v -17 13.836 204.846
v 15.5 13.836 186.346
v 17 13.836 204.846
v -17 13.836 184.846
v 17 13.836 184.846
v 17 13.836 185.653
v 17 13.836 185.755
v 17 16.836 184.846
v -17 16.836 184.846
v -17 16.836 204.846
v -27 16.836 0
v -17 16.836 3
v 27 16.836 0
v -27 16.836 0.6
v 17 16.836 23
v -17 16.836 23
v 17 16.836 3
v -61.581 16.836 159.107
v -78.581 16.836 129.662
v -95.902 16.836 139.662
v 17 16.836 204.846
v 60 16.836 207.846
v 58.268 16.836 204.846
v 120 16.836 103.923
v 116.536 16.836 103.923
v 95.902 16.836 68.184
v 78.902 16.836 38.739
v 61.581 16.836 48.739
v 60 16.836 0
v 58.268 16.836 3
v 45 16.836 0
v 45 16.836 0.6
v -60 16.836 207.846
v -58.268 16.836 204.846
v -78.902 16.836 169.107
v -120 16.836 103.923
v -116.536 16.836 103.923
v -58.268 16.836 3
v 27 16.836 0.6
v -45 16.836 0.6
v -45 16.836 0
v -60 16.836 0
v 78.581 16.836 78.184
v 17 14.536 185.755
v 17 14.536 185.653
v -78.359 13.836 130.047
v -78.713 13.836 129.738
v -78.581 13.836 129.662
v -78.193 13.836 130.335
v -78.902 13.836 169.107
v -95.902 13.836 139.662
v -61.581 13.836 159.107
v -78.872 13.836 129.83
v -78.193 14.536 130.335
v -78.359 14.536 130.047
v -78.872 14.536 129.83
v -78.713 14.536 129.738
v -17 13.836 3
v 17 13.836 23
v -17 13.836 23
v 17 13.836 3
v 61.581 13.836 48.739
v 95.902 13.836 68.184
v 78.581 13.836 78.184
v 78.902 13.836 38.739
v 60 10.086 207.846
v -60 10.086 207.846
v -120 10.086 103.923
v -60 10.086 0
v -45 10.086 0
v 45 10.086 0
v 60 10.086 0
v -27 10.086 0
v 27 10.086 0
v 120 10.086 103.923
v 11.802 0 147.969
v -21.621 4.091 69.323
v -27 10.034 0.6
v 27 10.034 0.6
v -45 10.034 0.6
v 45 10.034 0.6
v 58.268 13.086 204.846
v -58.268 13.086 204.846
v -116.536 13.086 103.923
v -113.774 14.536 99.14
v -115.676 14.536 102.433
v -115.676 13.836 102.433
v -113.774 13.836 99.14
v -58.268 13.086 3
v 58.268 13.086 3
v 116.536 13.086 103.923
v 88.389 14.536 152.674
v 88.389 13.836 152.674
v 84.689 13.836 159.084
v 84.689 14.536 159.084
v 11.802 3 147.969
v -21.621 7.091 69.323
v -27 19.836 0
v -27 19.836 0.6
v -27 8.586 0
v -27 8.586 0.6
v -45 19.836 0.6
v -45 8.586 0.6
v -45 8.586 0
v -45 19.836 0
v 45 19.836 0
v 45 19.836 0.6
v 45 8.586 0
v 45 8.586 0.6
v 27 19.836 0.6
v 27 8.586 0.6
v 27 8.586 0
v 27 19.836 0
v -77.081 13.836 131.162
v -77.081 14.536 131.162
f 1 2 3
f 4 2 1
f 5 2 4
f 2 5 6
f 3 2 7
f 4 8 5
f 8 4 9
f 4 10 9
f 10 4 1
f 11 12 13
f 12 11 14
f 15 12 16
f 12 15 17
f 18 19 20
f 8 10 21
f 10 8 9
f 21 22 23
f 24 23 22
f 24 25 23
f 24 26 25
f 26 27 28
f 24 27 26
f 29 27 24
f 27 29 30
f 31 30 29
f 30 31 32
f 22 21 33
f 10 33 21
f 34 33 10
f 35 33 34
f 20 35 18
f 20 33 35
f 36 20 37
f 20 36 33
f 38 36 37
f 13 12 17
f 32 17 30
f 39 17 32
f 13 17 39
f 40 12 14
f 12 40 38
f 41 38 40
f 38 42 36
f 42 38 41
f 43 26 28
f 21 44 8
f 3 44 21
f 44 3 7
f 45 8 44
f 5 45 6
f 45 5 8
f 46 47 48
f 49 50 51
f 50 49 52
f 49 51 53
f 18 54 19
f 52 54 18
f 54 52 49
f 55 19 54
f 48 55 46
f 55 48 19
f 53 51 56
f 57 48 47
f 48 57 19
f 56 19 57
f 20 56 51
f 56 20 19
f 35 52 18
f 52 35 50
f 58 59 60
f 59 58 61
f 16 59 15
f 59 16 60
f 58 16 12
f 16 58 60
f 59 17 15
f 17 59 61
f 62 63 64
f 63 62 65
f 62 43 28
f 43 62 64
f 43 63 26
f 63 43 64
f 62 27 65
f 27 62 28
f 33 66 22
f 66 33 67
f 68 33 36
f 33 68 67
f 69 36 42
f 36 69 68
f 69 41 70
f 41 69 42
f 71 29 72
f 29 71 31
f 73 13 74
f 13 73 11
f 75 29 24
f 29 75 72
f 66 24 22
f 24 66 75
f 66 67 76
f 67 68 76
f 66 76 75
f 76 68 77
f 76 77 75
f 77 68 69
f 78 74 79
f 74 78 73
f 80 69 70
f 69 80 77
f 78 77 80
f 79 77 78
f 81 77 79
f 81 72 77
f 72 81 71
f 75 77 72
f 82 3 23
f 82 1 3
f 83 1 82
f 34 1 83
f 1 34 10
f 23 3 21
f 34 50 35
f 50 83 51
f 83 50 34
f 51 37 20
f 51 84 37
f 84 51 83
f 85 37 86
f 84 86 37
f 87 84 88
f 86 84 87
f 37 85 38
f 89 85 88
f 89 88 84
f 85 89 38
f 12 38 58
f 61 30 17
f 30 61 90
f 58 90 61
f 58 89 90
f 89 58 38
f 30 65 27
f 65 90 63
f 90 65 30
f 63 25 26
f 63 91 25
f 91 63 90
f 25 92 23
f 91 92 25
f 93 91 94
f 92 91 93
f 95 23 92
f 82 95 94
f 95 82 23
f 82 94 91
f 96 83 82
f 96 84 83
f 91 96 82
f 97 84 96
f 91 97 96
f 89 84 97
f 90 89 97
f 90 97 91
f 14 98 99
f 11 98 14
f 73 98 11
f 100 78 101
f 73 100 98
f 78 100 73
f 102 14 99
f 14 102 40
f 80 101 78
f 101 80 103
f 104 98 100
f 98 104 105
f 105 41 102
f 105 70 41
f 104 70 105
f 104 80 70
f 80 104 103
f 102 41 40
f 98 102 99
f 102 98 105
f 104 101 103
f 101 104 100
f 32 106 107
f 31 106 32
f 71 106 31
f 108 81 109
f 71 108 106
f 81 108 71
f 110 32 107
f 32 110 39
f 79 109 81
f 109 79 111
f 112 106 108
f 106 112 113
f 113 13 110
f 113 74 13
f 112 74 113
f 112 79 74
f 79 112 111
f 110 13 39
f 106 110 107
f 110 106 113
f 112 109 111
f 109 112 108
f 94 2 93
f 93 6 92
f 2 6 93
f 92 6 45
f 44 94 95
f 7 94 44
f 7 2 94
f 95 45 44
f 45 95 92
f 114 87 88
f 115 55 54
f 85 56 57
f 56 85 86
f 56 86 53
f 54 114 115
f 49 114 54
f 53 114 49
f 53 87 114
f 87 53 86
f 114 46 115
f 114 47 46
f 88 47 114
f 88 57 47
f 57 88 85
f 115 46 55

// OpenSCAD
/*
    parametric_faceted_hex_wall_tile_mount_v28_multi_plate_gusset_support.scad
    ----------------------------------------------------------------
    Regular asymmetric low-poly hex wall tile.

    v28 goals
    ---------
    1. Multi-object plate packing is the default design target.
    2. Preserve a TRUE regular hexagon -- no X/Y stretching.
    3. Default maximum corner-to-corner width = 240 mm / 9.449 in.
    4. Vertical export rests on a complete flat hex side, not a point.
    5. Open back remains fully open.
    6. Hidden mounting pads remain clipped below the visible face.
    7. One master thickness controls shell, perimeter, and pads.
    8. Integrated low-profile sacrificial stabilizer feet are enabled by default.
    9. Automatic sacrificial INTERNAL GUSSETS support mounting pads that would
       otherwise begin in mid-air during vertical printing.
    10. Gussets grow diagonally from the perimeter wall toward the affected pad,
        avoiding tall free-standing support fins.
    11. Gussets stay on the cavity side so the wall/adhesive-facing rear surface
        remains unobstructed.

    Recommended default
    -------------------
    face_size_reference      = "across_corners";
    face_size_units          = "mm";
    face_size                = 240.0;   // 9.449" maximum width

    tile_rotation_deg        = 15;

    export_orientation       = "vertical";
    vertical_edge_angle_deg  = 15;      // flat side on build plate

    master_thickness_mm      = 3.0;
    add_mount_pads           = true;
    add_mount_ribs           = false;

    // Multi-copy stability:
    add_vertical_breakaway_feet = true;
    vertical_foot_depth_mm       = 5.0;
    vertical_foot_height_mm      = 0.60;
    vertical_foot_neck_mm        = 0.80;

    Export
    ------
    F6 Render
    File -> Export -> Export as STL
*/


// =============================================================================
// CUSTOMIZER PARAMETERS
// =============================================================================


/* [Finished Face Size] */

// "bounding_square"
//     face_size is the maximum X and Y envelope.
//
// "flat_to_flat"
//     face_size is the traditional hex flat-to-flat dimension.
//
// "across_corners"
//     face_size is the regular-hex corner-to-corner dimension.
//
// v28 DEFAULT:
// across_corners = 240 mm so the vertically printed tile is about:
//     X = 240.0 mm
//     Z = 207.85 mm
// while resting on a complete flat edge.
face_size_reference = "across_corners"; // [bounding_square, flat_to_flat, across_corners]

// Units used by face_size.
face_size_units = "mm";                   // [mm, in]

// Default = 240 mm / 9.449 in maximum corner-to-corner width.
// This leaves useful X-axis margin on a 256 mm plate.
face_size = 240.0;

// Rotation of the finished hex within its face plane.
//
// IMPORTANT:
// 15 degrees gives a regular hex an equal X/Y bounding envelope.
// With bounding_square + 254 mm this produces approximately:
//     X = 254.0 mm
//     Y = 254.0 mm
tile_rotation_deg = 15;


/* [Export / Print Orientation] */

// "flat"     = conventional CAD orientation; decorative face points +Z.
// "vertical" = rotate final part onto an edge for vertical printing.
export_orientation = "vertical";          // [flat, vertical]

// Additional in-plane rotation used ONLY before standing the part vertically.
//
// IMPORTANT:
// The finished face uses tile_rotation_deg = 15 so its X/Y envelope is exactly
// square. A regular hex rests on a FLAT SIDE when its effective print-plane
// rotation is 30 degrees (modulo 60 degrees).
//
// Therefore the default vertical export adds another 15 degrees:
//
//     15 deg finished-face rotation
//   + 15 deg vertical export rotation
//   = 30 deg effective print rotation
//
// This puts a complete flat hex side on the build plate instead of a point.
// The transformed model is automatically translated so that side rests at Z=0.
// Rotate the finished 15-degree face orientation another 15 degrees before
// standing it up. 15 + 15 = 30 degrees, which places a complete hex side
// horizontally at the bottom rather than balancing the tile on a vertex.
vertical_edge_angle_deg = 15;

// Add small breakaway stabilizer feet after the model is stood vertically.
// Normally leave OFF and use a slicer brim if required.
add_vertical_breakaway_feet = true;

// Breakaway-foot dimensions.
vertical_foot_length_mm = 18.0;
vertical_foot_depth_mm = 5.0;
vertical_foot_height_mm = 0.60;
vertical_foot_neck_mm = 0.80;


/* [MASTER THICKNESS] */

// Main material thickness control.
master_thickness_mm = 3.0;

// Optional tuning multipliers.
front_shell_multiplier = 1.0;
perimeter_multiplier   = 1.0;
mount_pad_multiplier   = 1.0;


/* [Front Relief] */

// "proportional" scales relief with the true flat-to-flat dimension.
// "absolute" uses explicit millimeter values.
relief_height_mode = "proportional";      // [proportional, absolute]

relief_scale = 1.0;

// Relative relief proportions.
peak_height_ratio = 0.081;
ridge_to_peak_ratio = 0.757;
edge_to_peak_ratio = 0.097;

// Used only in absolute mode.
peak_height_mm   = 18.5;
ridge_height_mm = 14.0;
edge_height_mm  = 1.8;

// Minimum air gap between inner roof and mounting geometry.
edge_clearance_mm = 0.60;


/* [Facet Layout] */

peak_angle_deg = 45;
peak_radius_ratio = 0.38;

ridge_angle_deg = 208;
ridge_radius_ratio = 0.34;


/* [Wall Mounting] */

add_mount_pads = true;

// Width parallel to local hex edge.
mount_pad_width_mm = 34.0;

// Radial depth into the cavity.
mount_pad_depth_mm = 24.0;

// Structural overlap beneath the inner perimeter shell.
mount_pad_overlap_mm = 4.0;

// Pull mounting geometry inward from the visible outside perimeter.
 // Keep this smaller than the perimeter-wall thickness so the pad still
 // overlaps the wall by a positive amount.
// IMPORTANT:
 // Must be LESS than perimeter_wall_thickness_mm so the pads physically
 // overlap the perimeter wall and become one connected solid.
 mount_pad_edge_inset_mm = 1.0;

// Clearance below underside of visible face.
mount_face_clearance_mm = 0.75;

// Mount-pad directions in the tile's local coordinate system.
mount_pad_angles = [60, 120, 240, 300];


/* [Mount Reinforcement] */

add_mount_ribs = false;

mount_rib_width_mm  = 3.0;
mount_rib_height_mm = 5.0;
mount_rib_depth_mm  = 8.0;


/* [Optional Screw Holes] */

add_pad_screw_holes = false;

pad_screw_hole_diameter_mm = 4.5;



/* [Plate Packing Guidance] */

// These values do NOT duplicate objects inside the STL.
// They provide planning numbers in the OpenSCAD console for arranging
// multiple copies in the slicer.
//
// Typical X2D-style plate planning:
//   usable Y = 256 mm
//   keep a conservative front/rear margin
plate_depth_mm = 256.0;

plate_front_margin_mm = 8.0;
plate_rear_margin_mm  = 8.0;

// Recommended empty gap between adjacent standing tiles.
// Increase if using aggressive acceleration or if the printer has noticeable
// resonance/wobble on tall parts.
recommended_inter_tile_gap_mm = 8.0;

// Feet extend from Y=0 to vertical_foot_depth_mm.
// The actual tile relief occupies approximately peak_height in Y.
// Packing pitch uses whichever is deeper, plus the inter-tile gap.


/* [Vertical Anti-Float Gussets] */

// Some mounting pads begin above the build plate when the tile is printed
// vertically. Instead of a tall free-standing fin, v28 generates a short,
// diagonal sacrificial gusset from the already-printed perimeter wall toward
// the lowest corner of each affected pad.
//
// The gusset:
// - stays inside the rear cavity
// - is thin in Y for easy removal
// - grows from the shell toward the pad
// - is generated only for pads that would otherwise start as an island
add_vertical_antifloat_gussets = true;

// Thin sacrificial thickness into the cavity.
antifloat_gusset_thickness_mm = 0.70;

// How far the gusset extends into the pad for reliable layer connection.
antifloat_gusset_pad_overlap_mm = 1.50;

// Vertical distance below the first pad layer used for the shell-side anchor.
// A 30 mm drop keeps the diagonal print angle conservative while remaining
// dramatically shorter than the previous full-height support fins.
antifloat_gusset_drop_mm = 30.0;

// Height of the short attachment edge against the perimeter wall.
antifloat_gusset_wall_base_mm = 5.0;

// Keep the wall anchor slightly inside the visible outer perimeter.
antifloat_gusset_wall_inset_mm = 1.5;

// Ignore a pad if its lowest point is already essentially on the build plate.
antifloat_min_height_mm = 0.80;


/* [Advanced] */

polyhedron_convexity = 12;
screw_hole_fn = 40;

// Small numerical tolerance.
eps = 0.01;


// =============================================================================
// HELPERS
// =============================================================================

function polar(angle_deg, radius) =
    [
        radius * cos(angle_deg),
        radius * sin(angle_deg)
    ];

function hex_vertex_unrotated(i, radius) =
    [
        radius * cos(30 + i * 60),
        radius * sin(30 + i * 60)
    ];

function rotate2d(p, angle_deg) =
    [
        p[0] * cos(angle_deg) - p[1] * sin(angle_deg),
        p[0] * sin(angle_deg) + p[1] * cos(angle_deg)
    ];


// Position of a raw mount-pad corner after all in-plane rotations used by the
// vertical export. Returned as [final_X, final_Z] because after rotate X=90,
// original in-plane Y becomes print Z.
function mount_print_corner(angle_deg, radial_r, lateral_t) =
    let(
        theta =
            angle_deg
            + tile_rotation_deg
            + vertical_edge_angle_deg
    )
    [
        radial_r * cos(theta) - lateral_t * sin(theta),
        vertical_half_y
            + radial_r * sin(theta)
            + lateral_t * cos(theta)
    ];

function mount_print_corners(angle_deg) =
    [
        mount_print_corner(
            angle_deg,
            mount_pad_inner_r,
            -mount_pad_width_mm / 2
        ),
        mount_print_corner(
            angle_deg,
            mount_pad_inner_r,
             mount_pad_width_mm / 2
        ),
        mount_print_corner(
            angle_deg,
            mount_pad_desired_outer_r,
            -mount_pad_width_mm / 2
        ),
        mount_print_corner(
            angle_deg,
            mount_pad_desired_outer_r,
             mount_pad_width_mm / 2
        )
    ];

function mount_corner_z_values(angle_deg) =
    [
        for (p = mount_print_corners(angle_deg))
            p[1]
    ];

function mount_lowest_z(angle_deg) =
    min(mount_corner_z_values(angle_deg));

function mount_lowest_corner_index(angle_deg) =
    search(
        mount_lowest_z(angle_deg),
        mount_corner_z_values(angle_deg)
    )[0];

function mount_lowest_x(angle_deg) =
    mount_print_corners(angle_deg)[
        mount_lowest_corner_index(angle_deg)
    ][0];


// Half-width of the stood-up regular hex at a given print Z.
//
// In the default flat-side-down vertical orientation:
// - bottom/top edges are flat
// - maximum width is across corners
// - total print height is flat-to-flat
//
// This lets the sacrificial gusset anchor itself directly into the perimeter
// wall at the same side of the tile as the affected mounting pad.
function vertical_hex_half_width_at_z(z_mm) =
    let(
        zc = min(max(z_mm, 0), vertical_print_height),
        dz = min(zc, vertical_print_height - zc)
    )
    hex_side_length / 2 + dz / tan(60);

function hex_vertex(i, radius) =
    rotate2d(
        hex_vertex_unrotated(i, radius),
        tile_rotation_deg
    );

// Half-width / half-height of a unit-circumradius rotated regular hex.
function unit_hex_half_x(rotation_deg) =
    max([
        for (i = [0 : 5])
            abs(
                cos(30 + i * 60 + rotation_deg)
            )
    ]);

function unit_hex_half_y(rotation_deg) =
    max([
        for (i = [0 : 5])
            abs(
                sin(30 + i * 60 + rotation_deg)
            )
    ]);

// Bounding box of a regular hex with circumradius r.
function hex_bbox_x(r, rotation_deg) =
    2 * r * unit_hex_half_x(rotation_deg);

function hex_bbox_y(r, rotation_deg) =
    2 * r * unit_hex_half_y(rotation_deg);


// =============================================================================
// DERIVED MATERIAL THICKNESSES
// =============================================================================

front_shell_thickness_mm =
    master_thickness_mm * front_shell_multiplier;

perimeter_wall_thickness_mm =
    master_thickness_mm * perimeter_multiplier;

mount_pad_thickness_mm =
    master_thickness_mm * mount_pad_multiplier;


// =============================================================================
// DERIVED FACE DIMENSIONS
// =============================================================================

_face_size_mm =
    face_size_units == "in"
        ? face_size * 25.4
        : face_size;

// If bounding_square is selected, choose the largest regular-hex radius that
// fits inside both the requested X and Y dimensions.
//
// At tile_rotation_deg = 15, unit X and Y extents are equal, so both dimensions
// become exactly face_size.
r_outer =
    face_size_reference == "flat_to_flat"
        ? (_face_size_mm / 2) / cos(30)
        : face_size_reference == "across_corners"
            ? _face_size_mm / 2
            : min(
                _face_size_mm / (2 * unit_hex_half_x(tile_rotation_deg)),
                _face_size_mm / (2 * unit_hex_half_y(tile_rotation_deg))
              );

tile_flat_to_flat =
    2 * r_outer * cos(30);

tile_across_corners =
    2 * r_outer;

finished_bbox_x =
    hex_bbox_x(r_outer, tile_rotation_deg);

finished_bbox_y =
    hex_bbox_y(r_outer, tile_rotation_deg);

outer_apothem =
    tile_flat_to_flat / 2;

inner_apothem =
    outer_apothem - perimeter_wall_thickness_mm;

r_inner =
    inner_apothem / cos(30);

inner_flat_length =
    2 * inner_apothem * tan(30);

hex_side_length =
    r_outer;


// =============================================================================
// DERIVED RELIEF HEIGHTS
// =============================================================================

_peak_unscaled =
    relief_height_mode == "proportional"
        ? tile_flat_to_flat * peak_height_ratio
        : peak_height_mm;

_ridge_unscaled =
    relief_height_mode == "proportional"
        ? _peak_unscaled * ridge_to_peak_ratio
        : ridge_height_mm;

_requested_edge_unscaled =
    relief_height_mode == "proportional"
        ? _peak_unscaled * edge_to_peak_ratio
        : edge_height_mm;

peak_height =
    _peak_unscaled * relief_scale;

ridge_height =
    _ridge_unscaled * relief_scale;

requested_edge_height =
    _requested_edge_unscaled * relief_scale;

// Enough vertical room for front shell + complete pad + clearance.
minimum_edge_height =
    front_shell_thickness_mm
    + mount_pad_thickness_mm
    + mount_face_clearance_mm;

edge_height =
    max(
        requested_edge_height,
        minimum_edge_height
    );


// =============================================================================
// DERIVED MOUNTING GEOMETRY
// =============================================================================

mount_pad_desired_outer_r =
    inner_apothem + mount_pad_overlap_mm;

mount_pad_inner_r =
    mount_pad_desired_outer_r - mount_pad_depth_mm;

mount_pad_center_r =
    mount_pad_desired_outer_r - mount_pad_depth_mm / 2;

mount_clip_apothem =
    outer_apothem - mount_pad_edge_inset_mm;

mount_clip_radius =
    mount_clip_apothem / cos(30);


// =============================================================================
// VERTICAL-EXPORT DERIVED VALUES
// =============================================================================
//
// The tile is first rotated around Z by vertical_edge_angle_deg, then stood up
// by +90 degrees around X.
//
// We calculate the local Y envelope AFTER that optional Z rotation so the
// final model can be translated to put its lowest point exactly on Z=0.

vertical_rotation_total_deg =
    vertical_edge_angle_deg;

vertical_half_y =
    max([
        for (i = [0 : 5])
            abs(
                r_outer
                * sin(
                    30
                    + i * 60
                    + tile_rotation_deg
                    + vertical_rotation_total_deg
                )
            )
    ]);

vertical_print_height =
    2 * vertical_half_y;

// After rotate([90,0,0]), original +Z becomes -Y.
// Translate by peak_height so all relief lies in positive Y.
vertical_print_depth =
    peak_height;

// Multi-copy packing envelope in Y.
//
// vertical_tile() occupies approximately peak_height of Y-depth.
// Breakaway feet occupy vertical_foot_depth_mm.
// Use the larger dimension as the per-part physical depth.
vertical_object_depth =
    add_vertical_breakaway_feet
        ? vertical_print_depth + 3.0
        : vertical_print_depth;

recommended_copy_pitch_y =
    vertical_object_depth + recommended_inter_tile_gap_mm;

usable_plate_depth =
    plate_depth_mm
    - plate_front_margin_mm
    - plate_rear_margin_mm;

estimated_copies_per_plate_depth =
    max(
        1,
        floor(
            (
                usable_plate_depth
                + recommended_inter_tile_gap_mm
            )
            / recommended_copy_pitch_y
        )
    );


// =============================================================================
// VALIDATION
// =============================================================================

assert(
    _face_size_mm > 0,
    "face_size must produce a positive dimension."
);

assert(
    master_thickness_mm > 0,
    "master_thickness_mm must be greater than zero."
);

assert(
    front_shell_multiplier > 0
    && perimeter_multiplier > 0
    && mount_pad_multiplier > 0,
    "All thickness multipliers must be greater than zero."
);

assert(
    front_shell_thickness_mm > 0,
    "front_shell_thickness_mm must be greater than zero."
);

assert(
    perimeter_wall_thickness_mm > 0,
    "perimeter_wall_thickness_mm must be greater than zero."
);

assert(
    perimeter_wall_thickness_mm < outer_apothem,
    "perimeter_wall_thickness_mm is too large for this tile."
);

assert(
    inner_apothem > 0,
    "The selected perimeter wall leaves no hollow interior."
);

assert(
    edge_height > front_shell_thickness_mm,
    "Internal error: edge_height must exceed front_shell_thickness_mm."
);

assert(
    ridge_height > edge_height,
    "ridge_height must remain greater than the effective edge height."
);

assert(
    peak_height > ridge_height,
    "peak_height must remain greater than ridge_height."
);

assert(
    peak_radius_ratio > 0 && peak_radius_ratio < 0.90,
    "peak_radius_ratio must be between 0 and 0.90."
);

assert(
    ridge_radius_ratio > 0 && ridge_radius_ratio < 0.90,
    "ridge_radius_ratio must be between 0 and 0.90."
);

assert(
    mount_pad_width_mm > 0,
    "mount_pad_width_mm must be greater than zero."
);

assert(
    mount_pad_depth_mm > 0,
    "mount_pad_depth_mm must be greater than zero."
);

assert(
    mount_pad_thickness_mm > 0,
    "mount_pad_thickness_mm must be greater than zero."
);

assert(
    mount_pad_overlap_mm >= 0,
    "mount_pad_overlap_mm cannot be negative."
);

assert(
    mount_pad_edge_inset_mm >= 0,
    "mount_pad_edge_inset_mm cannot be negative."
);

assert(
    mount_pad_edge_inset_mm < perimeter_wall_thickness_mm,
    "mount_pad_edge_inset_mm must be smaller than perimeter_wall_thickness_mm so mounting pads overlap and join the perimeter wall."
);

assert(
    mount_face_clearance_mm >= 0,
    "mount_face_clearance_mm cannot be negative."
);

assert(
    mount_clip_apothem > 0,
    "mount_pad_edge_inset_mm is too large."
);

assert(
    mount_pad_inner_r > 0,
    "mount_pad_depth_mm is too large and reaches/passes the tile center."
);

assert(
    !add_pad_screw_holes
    || pad_screw_hole_diameter_mm < mount_pad_width_mm * 0.75,
    "pad_screw_hole_diameter_mm is too large for the mounting pad."
);

assert(
    !add_mount_ribs
    || mount_rib_height_mm > 0,
    "mount_rib_height_mm must be greater than zero."
);

assert(
    !add_vertical_breakaway_feet
    || export_orientation == "vertical",
    "Vertical breakaway feet require export_orientation = \"vertical\"."
);

assert(
    plate_depth_mm > 0,
    "plate_depth_mm must be greater than zero."
);

assert(
    plate_front_margin_mm >= 0
    && plate_rear_margin_mm >= 0,
    "Plate margins cannot be negative."
);

assert(
    recommended_inter_tile_gap_mm >= 0,
    "recommended_inter_tile_gap_mm cannot be negative."
);

assert(
    usable_plate_depth > 0,
    "Plate margins leave no usable plate depth."
);


assert(
    antifloat_gusset_thickness_mm > 0
    && antifloat_gusset_thickness_mm <= mount_pad_thickness_mm,
    "antifloat_gusset_thickness_mm must be > 0 and no thicker than the mounting pad."
);

assert(
    antifloat_gusset_pad_overlap_mm > 0,
    "antifloat_gusset_pad_overlap_mm must be greater than zero."
);

assert(
    antifloat_gusset_drop_mm > 0,
    "antifloat_gusset_drop_mm must be greater than zero."
);

assert(
    antifloat_gusset_wall_base_mm > 0,
    "antifloat_gusset_wall_base_mm must be greater than zero."
);

assert(
    antifloat_gusset_wall_inset_mm >= 0,
    "antifloat_gusset_wall_inset_mm cannot be negative."
);


// =============================================================================
// DIAGNOSTIC OUTPUT
// =============================================================================

echo("====================================================");
echo("FACETED HEX WALL TILE v28 - MULTI-PLATE / INTERNAL GUSSET SUPPORT");
echo("====================================================");

echo(str("face size reference      : ", face_size_reference));
echo(str("requested face size      : ", _face_size_mm, " mm"));
echo(str("tile rotation            : ", tile_rotation_deg, " deg"));

echo(str("finished bbox X          : ", finished_bbox_x, " mm"));
echo(str("finished bbox Y          : ", finished_bbox_y, " mm"));
echo(str("finished bbox X inches   : ", finished_bbox_x / 25.4, " in"));
echo(str("finished bbox Y inches   : ", finished_bbox_y / 25.4, " in"));

echo(str("flat-to-flat             : ", tile_flat_to_flat, " mm"));
echo(str("across-corners           : ", tile_across_corners, " mm"));
echo(str("hex side length          : ", hex_side_length, " mm"));

echo(str("MASTER thickness         : ", master_thickness_mm, " mm"));
echo(str("actual front shell       : ", front_shell_thickness_mm, " mm"));
echo(str("actual perimeter wall    : ", perimeter_wall_thickness_mm, " mm"));
echo(str("actual mount pad         : ", mount_pad_thickness_mm, " mm"));

echo(str("requested edge height    : ", requested_edge_height, " mm"));
echo(str("minimum edge height      : ", minimum_edge_height, " mm"));
echo(str("EFFECTIVE edge height    : ", edge_height, " mm"));

echo(str("ridge height             : ", ridge_height, " mm"));
echo(str("peak height              : ", peak_height, " mm"));
echo(str("peak height inches       : ", peak_height / 25.4, " in"));

echo(str("mount pad width          : ", mount_pad_width_mm, " mm"));
echo(str("mount pad depth          : ", mount_pad_depth_mm, " mm"));
echo(str("mount pad thickness      : ", mount_pad_thickness_mm, " mm"));
echo(str("mount pad overlap        : ", mount_pad_overlap_mm, " mm"));
echo(str("mount edge inset         : ", mount_pad_edge_inset_mm, " mm"));
echo(str("mount/face clearance     : ", mount_face_clearance_mm, " mm"));

echo(str("export orientation       : ", export_orientation));

if (
    export_orientation == "vertical"
    && add_mount_pads
    && add_vertical_antifloat_gussets
) {
    for (a = mount_pad_angles)
        echo(
            str(
                "mount pad ",
                a,
                " deg lowest print Z : ",
                mount_lowest_z(a),
                " mm"
            )
        );
}

echo(str("vertical extra rotation  : ", vertical_edge_angle_deg, " deg"));
echo(str("effective print rotation : ",
         tile_rotation_deg + vertical_edge_angle_deg, " deg"));

if (export_orientation == "vertical"
    && abs(
        ((tile_rotation_deg + vertical_edge_angle_deg) % 60) - 30
    ) < 0.001)
    echo("build-plate contact      : FLAT HEX SIDE");
else if (export_orientation == "vertical")
    echo("build-plate contact      : WARNING - NOT EXACTLY FLAT-SIDE DOWN");

if (export_orientation == "vertical") {
    echo(str("vertical print height    : ", vertical_print_height, " mm"));
    echo(str("vertical relief depth    : ", vertical_print_depth, " mm"));
    echo(str("vertical object depth    : ", vertical_object_depth, " mm"));
    echo(str("recommended Y gap        : ", recommended_inter_tile_gap_mm, " mm"));
    echo(str("recommended Y pitch      : ", recommended_copy_pitch_y, " mm"));
    echo(str("usable plate Y depth     : ", usable_plate_depth, " mm"));
    echo(str("estimated copies in Y    : ", estimated_copies_per_plate_depth));
}

if (edge_height > requested_edge_height)
    echo(
        str(
            "AUTO EDGE FIX ACTIVE: edge raised from ",
            requested_edge_height,
            " mm to ",
            edge_height,
            " mm."
        )
    );

echo("====================================================");


// =============================================================================
// FRONT RELIEF CONTROL POINTS
// =============================================================================

P_xy =
    polar(
        peak_angle_deg + tile_rotation_deg,
        r_outer * peak_radius_ratio
    );

Q_xy =
    polar(
        ridge_angle_deg + tile_rotation_deg,
        r_outer * ridge_radius_ratio
    );


// =============================================================================
// SHELL VERTICES
// =============================================================================

points =
    concat(

        // 0..5 : outer rear perimeter
        [
            for (i = [0 : 5])
                let(p = hex_vertex(i, r_outer))
                [p[0], p[1], 0]
        ],

        // 6..11 : outer front perimeter
        [
            for (i = [0 : 5])
                let(p = hex_vertex(i, r_outer))
                [p[0], p[1], edge_height]
        ],

        // 12..13 : outer peak / ridge
        [
            [P_xy[0], P_xy[1], peak_height],
            [Q_xy[0], Q_xy[1], ridge_height]
        ],

        // 14..19 : inner rear perimeter
        [
            for (i = [0 : 5])
                let(p = hex_vertex(i, r_inner))
                [p[0], p[1], 0]
        ],

        // 20..25 : inner front perimeter
        [
            for (i = [0 : 5])
                let(p = hex_vertex(i, r_inner))
                [p[0], p[1], edge_height - front_shell_thickness_mm]
        ],

        // 26..27 : inner peak / ridge
        [
            [
                P_xy[0],
                P_xy[1],
                peak_height - front_shell_thickness_mm
            ],
            [
                Q_xy[0],
                Q_xy[1],
                ridge_height - front_shell_thickness_mm
            ]
        ]
    );


// =============================================================================
// SHELL FACES
// =============================================================================

outer_roof_faces = [
    [6, 7, 12],
    [7, 8, 12],
    [6, 12, 11],

    [8, 13, 12],
    [11, 12, 13],

    [8, 9, 13],
    [9, 10, 13],
    [10, 11, 13]
];

inner_roof_faces = [
    [26, 21, 20],
    [26, 22, 21],
    [25, 26, 20],

    [26, 27, 22],
    [27, 26, 25],

    [27, 23, 22],
    [27, 24, 23],
    [27, 25, 24]
];

faces =
    concat(

        // Outer vertical perimeter
        [
            for (i = [0 : 5])
                [
                    i,
                    (i + 1) % 6,
                    6 + (i + 1) % 6,
                    6 + i
                ]
        ],

        outer_roof_faces,

        // Inner vertical perimeter
        [
            for (i = [0 : 5])
                [
                    14 + i,
                    20 + i,
                    20 + (i + 1) % 6,
                    14 + (i + 1) % 6
                ]
        ],

        inner_roof_faces,

        // Narrow rear perimeter ring only.
        // Center remains fully open.
        [
            for (i = [0 : 5])
                [
                    i,
                    14 + i,
                    14 + (i + 1) % 6,
                    (i + 1) % 6
                ]
        ]
    );


// =============================================================================
// TILE SHELL
// =============================================================================

module tile_shell() {
    polyhedron(
        points = points,
        faces = faces,
        convexity = polyhedron_convexity
    );
}


// =============================================================================
// SAFE MOUNTING VOLUME BELOW FRONT FACE
// =============================================================================

safe_edge_z =
    max(
        eps,
        edge_height
        - front_shell_thickness_mm
        - mount_face_clearance_mm
    );

safe_peak_z =
    max(
        eps,
        peak_height
        - front_shell_thickness_mm
        - mount_face_clearance_mm
    );

safe_ridge_z =
    max(
        eps,
        ridge_height
        - front_shell_thickness_mm
        - mount_face_clearance_mm
    );

safe_mount_points =
    concat(

        // 0..5 : rear outer perimeter
        [
            for (i = [0 : 5])
                let(p = hex_vertex(i, r_outer))
                [p[0], p[1], 0]
        ],

        // 6..11 : safe ceiling at outer perimeter
        [
            for (i = [0 : 5])
                let(p = hex_vertex(i, r_outer))
                [p[0], p[1], safe_edge_z]
        ],

        // 12..13 : safe ceiling under peak/ridge
        [
            [P_xy[0], P_xy[1], safe_peak_z],
            [Q_xy[0], Q_xy[1], safe_ridge_z]
        ]
    );

safe_mount_ceiling_faces = [
    [6, 7, 12],
    [7, 8, 12],
    [6, 12, 11],
    [8, 13, 12],
    [11, 12, 13],
    [8, 9, 13],
    [9, 10, 13],
    [10, 11, 13]
];

safe_mount_faces =
    concat(

        // Outer side walls.
        [
            for (i = [0 : 5])
                [
                    i,
                    (i + 1) % 6,
                    6 + (i + 1) % 6,
                    6 + i
                ]
        ],

        // Sloped safe ceiling.
        safe_mount_ceiling_faces,

        // Rear floor used only to close clipping volume.
        [[5, 4, 3, 2, 1, 0]]
    );

module safe_mount_volume() {
    polyhedron(
        points = safe_mount_points,
        faces = safe_mount_faces,
        convexity = polyhedron_convexity
    );
}


// =============================================================================
// HEX FOOTPRINT FOR MOUNT CLIPPING
// =============================================================================

module mount_clip_volume(height_mm) {
    linear_extrude(height = height_mm)
        polygon(
            points = [
                for (i = [0 : 5])
                    hex_vertex(i, mount_clip_radius)
            ]
        );
}


// =============================================================================
// RAW MOUNT PAD
// =============================================================================
//
// Mount-pad angles are local tile angles. tile_rotation_deg is applied so the
// pads remain attached to the same visual positions when the face rotates.

module raw_mount_pad(angle_deg) {
    rotate([0, 0, angle_deg + tile_rotation_deg])
        translate(
            [
                mount_pad_inner_r,
                -mount_pad_width_mm / 2,
                0
            ]
        )
            cube(
                [
                    mount_pad_depth_mm,
                    mount_pad_width_mm,
                    mount_pad_thickness_mm
                ]
            );
}


// =============================================================================
// CLIPPED MOUNT PAD
// =============================================================================

module mount_pad(angle_deg) {
    intersection() {

        raw_mount_pad(angle_deg);

        // Keep pad inside inset hex footprint.
        mount_clip_volume(
            mount_pad_thickness_mm + eps
        );

        // Hard stop below underside of front shell.
        safe_mount_volume();
    }
}


// =============================================================================
// OPTIONAL REINFORCING RIBS
// =============================================================================

module raw_mount_ribs(angle_deg) {

    rib_center_r =
        mount_pad_desired_outer_r
        - mount_rib_depth_mm / 2;

    rib_side_offset =
        max(
            0,
            mount_pad_width_mm / 2
            - mount_rib_width_mm
            - 2
        );

    rotate([0, 0, angle_deg + tile_rotation_deg]) {

        for (side = [-1, 1]) {

            translate(
                [
                    rib_center_r - mount_rib_depth_mm / 2,
                    side * rib_side_offset - mount_rib_width_mm / 2,
                    mount_pad_thickness_mm
                ]
            )

            rotate([90, 0, 90])

            linear_extrude(height = mount_rib_depth_mm)

            polygon(
                points = [
                    [0, 0],
                    [mount_rib_width_mm, 0],
                    [mount_rib_width_mm, mount_rib_height_mm],
                    [0, 0]
                ]
            );
        }
    }
}

module mount_ribs(angle_deg) {
    intersection() {

        raw_mount_ribs(angle_deg);

        mount_clip_volume(
            mount_pad_thickness_mm
            + mount_rib_height_mm
            + 0.1
        );

        safe_mount_volume();
    }
}


// =============================================================================
// OPTIONAL SCREW HOLE
// =============================================================================

module pad_screw_hole(angle_deg) {

    rotate([0, 0, angle_deg + tile_rotation_deg])

        translate(
            [
                mount_pad_center_r,
                0,
                -1
            ]
        )

            cylinder(
                d = pad_screw_hole_diameter_mm,
                h =
                    mount_pad_thickness_mm
                    + mount_rib_height_mm
                    + 2,
                $fn = screw_hole_fn
            );
}


// =============================================================================
// COMPLETE FINISHED TILE
// =============================================================================

module finished_tile() {

    difference() {

        union() {

            tile_shell();

            if (add_mount_pads) {

                for (a = mount_pad_angles) {

                    mount_pad(a);

                    if (add_mount_ribs)
                        mount_ribs(a);
                }
            }
        }

        if (
            add_mount_pads
            && add_pad_screw_holes
        ) {

            for (a = mount_pad_angles)
                pad_screw_hole(a);
        }
    }
}


// =============================================================================
// VERTICAL-PRINT TRANSFORM
// =============================================================================
//
// Transform order in OpenSCAD is inside-out:
//
// 1. finished_tile()
// 2. optional extra Z rotation for selecting another edge
// 3. rotate +90 degrees around X so the face stands vertically
// 4. translate so:
//      - relief depth occupies positive Y
//      - lowest tile point is exactly at Z=0

module vertical_tile() {

    translate(
        [
            0,
            peak_height,
            vertical_half_y
        ]
    )

    rotate([90, 0, 0])

    rotate([0, 0, vertical_edge_angle_deg])

        finished_tile();
}


// =============================================================================
// OPTIONAL BREAKAWAY VERTICAL FEET
// =============================================================================
//
// These are intentionally simple sacrificial tabs.
// They are added only in vertical export mode.
// Leave OFF unless a brim alone is not sufficient.

module vertical_breakaway_feet() {

    /*
        CONNECTED stabilizer feet.

        For flat-side-down vertical export, the bottom perimeter wall occupies
        approximately:

            Y = peak_height - edge_height  ...  peak_height

        and the bottom flat side spans roughly one hex-side length in X.

        The v25 feet were placed near Y=0 and too far outward in X, so they
        could become disconnected solids. v26 deliberately overlaps the
        actual bottom perimeter wall in both X and Y.

        The tabs extend only a few millimeters beyond the rear face, keeping
        Y-depth compact for multi-copy plate packing.
    */

    foot_center_x =
        hex_side_length * 0.30;

    // Safely inside the actual bottom flat-edge span.
    foot_length_x =
        min(
            vertical_foot_length_mm,
            hex_side_length * 0.25
        );

    // Bottom perimeter wall depth after the vertical transform.
    bottom_wall_y_min =
        peak_height - edge_height;

    bottom_wall_y_max =
        peak_height;

    // Extend a little toward the decorative face and a little behind the tile.
    foot_y_min =
        max(
            0,
            bottom_wall_y_min - 1.5
        );

    foot_y_max =
        bottom_wall_y_max + 3.0;

    attached_foot_depth =
        foot_y_max - foot_y_min;

    for (x = [-foot_center_x, foot_center_x]) {

        // Main shallow sacrificial pad.
        //
        // It overlaps the lower perimeter wall in volume, so CGAL produces
        // one connected body instead of merely touching at a plane.
        translate(
            [
                x - foot_length_x / 2,
                foot_y_min,
                0
            ]
        )
            cube(
                [
                    foot_length_x,
                    attached_foot_depth,
                    vertical_foot_height_mm
                ]
            );

        // Small reinforcing neck rising into the bottom perimeter wall.
        translate(
            [
                x - vertical_foot_neck_mm / 2,
                bottom_wall_y_min,
                0
            ]
        )
            cube(
                [
                    vertical_foot_neck_mm,
                    edge_height,
                    min(3.0, perimeter_wall_thickness_mm)
                ]
            );
    }
}



// =============================================================================
// AUTOMATIC VERTICAL ANTI-FLOAT GUSSETS
// =============================================================================
//
// These are sacrificial PRINTING AIDS.
//
// Each elevated mounting pad gets a thin triangular prism whose:
//   - upper tip overlaps the lowest pad corner
//   - lower/base edge overlaps the already-existing perimeter wall
//   - thickness lies only on the cavity side
//
// Because the support grows diagonally out of the shell, it avoids the long,
// free-standing vertical strips used in v27.
//
// The triangle is constructed directly in final print X/Z coordinates, then
// extruded a small amount in Y.

module xz_triangle_prism(p0, p1, p2, y0, thickness_y) {

    y1 = y0 + thickness_y;

    polyhedron(
        points = [
            [p0[0], y0, p0[1]],
            [p1[0], y0, p1[1]],
            [p2[0], y0, p2[1]],

            [p0[0], y1, p0[1]],
            [p1[0], y1, p1[1]],
            [p2[0], y1, p2[1]]
        ],

        faces = [
            [0, 2, 1],
            [3, 4, 5],

            [0, 1, 4, 3],
            [1, 2, 5, 4],
            [2, 0, 3, 5]
        ],

        convexity = 8
    );
}


module vertical_antifloat_gusset(angle_deg) {

    lowest_z = mount_lowest_z(angle_deg);
    lowest_x = mount_lowest_x(angle_deg);

    if (lowest_z > antifloat_min_height_mm) {

        // Choose a shell anchor below the first pad layer.
        anchor_z =
            max(
                0.40,
                lowest_z - antifloat_gusset_drop_mm
            );

        // Which side of the tile is the pad on?
        side_sign =
            lowest_x < 0 ? -1 : 1;

        // Anchor into the actual perimeter wall rather than floating in space.
        anchor_half_width =
            vertical_hex_half_width_at_z(anchor_z);

        anchor_x =
            side_sign
            * max(
                0,
                anchor_half_width
                - antifloat_gusset_wall_inset_mm
            );

        // Short vertical attachment edge against the perimeter wall.
        wall_base_z0 =
            max(
                0.20,
                anchor_z - antifloat_gusset_wall_base_mm / 2
            );

        wall_base_z1 =
            min(
                vertical_print_height - 0.20,
                anchor_z + antifloat_gusset_wall_base_mm / 2
            );

        // Move the gusset tip slightly into the pad, ensuring a true overlap
        // rather than a zero-thickness/tangent contact.
        tip_x =
            lowest_x
            - side_sign * antifloat_gusset_pad_overlap_mm;

        tip_z =
            lowest_z
            + antifloat_gusset_pad_overlap_mm;

        // Cavity-side Y position.
        //
        // The rear mounting pads occupy approximately:
        //   Y = peak_height - mount_pad_thickness_mm ... peak_height
        //
        // Put the gusset against the cavity-facing side of that pad.
        gusset_y =
            peak_height
            - mount_pad_thickness_mm;

        xz_triangle_prism(
            [anchor_x, wall_base_z0],
            [anchor_x, wall_base_z1],
            [tip_x, tip_z],
            gusset_y,
            antifloat_gusset_thickness_mm
        );
    }
}


module vertical_antifloat_gussets() {

    if (
        export_orientation == "vertical"
        && add_mount_pads
        && add_vertical_antifloat_gussets
    ) {
        for (a = mount_pad_angles)
            vertical_antifloat_gusset(a);
    }
}


// =============================================================================
// OUTPUT
// =============================================================================
//
// Default v28 exported STL target:
//   X ~ 240.00 mm  / 9.449 in
//   Y ~ relief depth (~17-19 mm depending on relief settings)
//   Z ~ 207.85 mm  / 8.183 in
//
// Multiple copies should be duplicated and arrayed along Y in the slicer.

module output_model() {

    if (export_orientation == "vertical") {

        union() {

            vertical_tile();

            if (add_vertical_breakaway_feet)
                vertical_breakaway_feet();

            vertical_antifloat_gussets();
        }

    } else {

        finished_tile();
    }
}

output_model();
